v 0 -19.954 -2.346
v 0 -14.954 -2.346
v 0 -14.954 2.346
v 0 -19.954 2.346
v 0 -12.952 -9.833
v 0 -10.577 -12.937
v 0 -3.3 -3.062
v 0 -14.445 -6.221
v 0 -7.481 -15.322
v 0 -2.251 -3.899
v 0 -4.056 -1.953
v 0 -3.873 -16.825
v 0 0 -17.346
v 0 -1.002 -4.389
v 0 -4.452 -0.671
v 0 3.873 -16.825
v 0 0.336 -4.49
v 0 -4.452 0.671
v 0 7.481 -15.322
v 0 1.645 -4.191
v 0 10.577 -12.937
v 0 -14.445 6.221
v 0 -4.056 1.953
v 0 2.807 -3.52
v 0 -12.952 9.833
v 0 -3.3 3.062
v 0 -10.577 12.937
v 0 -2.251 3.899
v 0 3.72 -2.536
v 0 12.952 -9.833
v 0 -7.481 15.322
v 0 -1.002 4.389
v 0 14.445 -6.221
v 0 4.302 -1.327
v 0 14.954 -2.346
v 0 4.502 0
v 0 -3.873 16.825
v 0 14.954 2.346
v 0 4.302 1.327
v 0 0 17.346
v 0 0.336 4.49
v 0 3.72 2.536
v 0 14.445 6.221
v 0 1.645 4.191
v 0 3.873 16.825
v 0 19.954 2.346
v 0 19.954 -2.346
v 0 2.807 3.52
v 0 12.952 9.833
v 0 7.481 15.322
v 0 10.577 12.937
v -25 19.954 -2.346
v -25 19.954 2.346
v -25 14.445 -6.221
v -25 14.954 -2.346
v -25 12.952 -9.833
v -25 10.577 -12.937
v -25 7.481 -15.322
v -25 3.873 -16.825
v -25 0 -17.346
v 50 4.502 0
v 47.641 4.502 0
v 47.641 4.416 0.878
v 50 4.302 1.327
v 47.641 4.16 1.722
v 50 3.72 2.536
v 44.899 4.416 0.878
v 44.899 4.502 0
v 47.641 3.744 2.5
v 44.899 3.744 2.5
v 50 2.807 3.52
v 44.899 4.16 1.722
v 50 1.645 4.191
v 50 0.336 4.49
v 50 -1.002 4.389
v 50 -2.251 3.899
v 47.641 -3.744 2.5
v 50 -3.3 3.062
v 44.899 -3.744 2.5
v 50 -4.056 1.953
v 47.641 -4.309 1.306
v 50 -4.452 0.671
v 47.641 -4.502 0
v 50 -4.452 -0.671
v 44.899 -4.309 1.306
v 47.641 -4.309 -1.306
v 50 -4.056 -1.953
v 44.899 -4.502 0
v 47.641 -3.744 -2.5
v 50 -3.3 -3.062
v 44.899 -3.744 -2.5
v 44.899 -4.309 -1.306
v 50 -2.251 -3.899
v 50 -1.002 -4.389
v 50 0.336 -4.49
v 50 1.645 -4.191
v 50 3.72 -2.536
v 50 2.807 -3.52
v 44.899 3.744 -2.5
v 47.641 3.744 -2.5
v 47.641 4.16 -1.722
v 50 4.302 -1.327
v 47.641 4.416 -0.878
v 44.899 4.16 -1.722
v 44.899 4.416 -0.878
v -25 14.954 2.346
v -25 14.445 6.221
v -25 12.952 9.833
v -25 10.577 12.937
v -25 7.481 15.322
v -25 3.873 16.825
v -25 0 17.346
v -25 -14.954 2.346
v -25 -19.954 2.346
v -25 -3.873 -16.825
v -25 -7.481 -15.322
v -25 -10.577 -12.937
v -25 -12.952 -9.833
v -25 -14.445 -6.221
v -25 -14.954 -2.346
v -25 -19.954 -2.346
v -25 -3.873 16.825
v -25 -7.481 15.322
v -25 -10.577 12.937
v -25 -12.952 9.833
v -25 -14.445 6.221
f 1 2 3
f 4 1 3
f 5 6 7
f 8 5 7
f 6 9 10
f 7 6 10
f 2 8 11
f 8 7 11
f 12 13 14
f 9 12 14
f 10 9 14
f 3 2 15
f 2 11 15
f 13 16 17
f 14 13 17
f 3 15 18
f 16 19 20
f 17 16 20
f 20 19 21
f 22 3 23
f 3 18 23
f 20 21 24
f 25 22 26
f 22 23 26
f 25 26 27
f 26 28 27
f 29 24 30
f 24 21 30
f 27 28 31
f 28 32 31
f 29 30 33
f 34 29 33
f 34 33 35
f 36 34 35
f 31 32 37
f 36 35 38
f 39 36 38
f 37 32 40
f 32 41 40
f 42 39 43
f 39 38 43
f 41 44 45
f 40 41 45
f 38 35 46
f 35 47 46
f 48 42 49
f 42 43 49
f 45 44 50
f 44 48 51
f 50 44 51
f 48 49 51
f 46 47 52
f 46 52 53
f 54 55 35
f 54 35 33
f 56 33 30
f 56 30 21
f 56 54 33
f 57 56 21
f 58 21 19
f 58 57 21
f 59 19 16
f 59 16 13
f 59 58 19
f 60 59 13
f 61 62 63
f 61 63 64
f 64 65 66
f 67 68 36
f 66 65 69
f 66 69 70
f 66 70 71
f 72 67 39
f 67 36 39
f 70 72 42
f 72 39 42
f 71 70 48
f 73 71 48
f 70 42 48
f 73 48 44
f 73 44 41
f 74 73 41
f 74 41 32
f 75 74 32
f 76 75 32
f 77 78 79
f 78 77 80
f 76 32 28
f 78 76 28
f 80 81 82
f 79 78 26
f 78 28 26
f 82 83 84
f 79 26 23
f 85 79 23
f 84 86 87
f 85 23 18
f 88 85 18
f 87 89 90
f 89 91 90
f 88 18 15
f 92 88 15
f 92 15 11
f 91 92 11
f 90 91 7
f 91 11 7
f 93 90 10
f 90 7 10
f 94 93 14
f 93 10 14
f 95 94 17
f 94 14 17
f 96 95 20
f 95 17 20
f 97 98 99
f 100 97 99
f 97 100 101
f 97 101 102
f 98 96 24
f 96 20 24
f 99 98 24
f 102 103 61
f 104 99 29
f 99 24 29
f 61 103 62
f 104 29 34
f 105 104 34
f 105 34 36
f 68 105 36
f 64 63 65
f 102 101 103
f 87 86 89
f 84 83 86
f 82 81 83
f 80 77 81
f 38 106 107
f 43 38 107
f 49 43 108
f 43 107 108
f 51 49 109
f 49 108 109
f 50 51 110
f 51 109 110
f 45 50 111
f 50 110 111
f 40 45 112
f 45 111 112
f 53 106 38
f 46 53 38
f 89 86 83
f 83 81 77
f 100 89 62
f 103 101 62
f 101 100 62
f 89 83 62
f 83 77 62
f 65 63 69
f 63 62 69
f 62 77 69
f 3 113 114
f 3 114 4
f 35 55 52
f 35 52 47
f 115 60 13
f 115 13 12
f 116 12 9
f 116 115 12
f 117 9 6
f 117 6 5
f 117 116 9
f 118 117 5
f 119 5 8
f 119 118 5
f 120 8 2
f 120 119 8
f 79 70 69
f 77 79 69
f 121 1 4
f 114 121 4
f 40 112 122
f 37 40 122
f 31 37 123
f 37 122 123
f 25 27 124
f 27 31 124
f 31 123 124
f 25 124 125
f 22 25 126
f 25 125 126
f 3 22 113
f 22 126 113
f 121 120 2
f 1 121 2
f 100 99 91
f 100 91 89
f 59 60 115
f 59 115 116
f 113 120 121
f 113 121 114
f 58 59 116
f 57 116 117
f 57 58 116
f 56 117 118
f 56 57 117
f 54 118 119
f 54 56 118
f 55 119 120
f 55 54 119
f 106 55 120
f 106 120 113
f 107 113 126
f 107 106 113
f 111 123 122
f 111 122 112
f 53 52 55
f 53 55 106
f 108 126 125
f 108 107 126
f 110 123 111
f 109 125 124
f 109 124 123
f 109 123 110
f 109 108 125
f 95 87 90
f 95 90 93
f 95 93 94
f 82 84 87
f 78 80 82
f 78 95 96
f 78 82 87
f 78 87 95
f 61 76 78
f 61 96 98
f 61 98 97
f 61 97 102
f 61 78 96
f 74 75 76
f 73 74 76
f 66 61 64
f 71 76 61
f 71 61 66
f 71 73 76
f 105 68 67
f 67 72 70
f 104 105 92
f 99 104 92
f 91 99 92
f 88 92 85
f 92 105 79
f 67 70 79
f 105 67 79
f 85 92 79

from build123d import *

# Parameters (mm, degrees)
F0_W        = 29.9085080624
F0_H        = 34.6928238869
F1_DEPTH    = 25
F2_R        = 4.5021693383
F3_DEPTH    = 50
F4_T1_DEPTH = 100
F5_DEPTH    = 5
F6_DEPTH    = 5
F8_DEPTH    = 2.5


# Not quite as in the source:
# - a fillet or chamfer that OpenCascade refuses, or shapes differently, is made with other operations: its cross-section is extruded or revolved along the edge and cut away or added


with BuildPart() as f1:
    # F0 (on Right) → F1 (new body)
    with BuildSketch(Plane.YZ):
        Rectangle(F0_W, F0_H)
    extrude(amount=-F1_DEPTH)

    # F2 (on Right) → F3 (join)
    with BuildSketch(Plane.YZ):
        Circle(F2_R)
    extrude(amount=F3_DEPTH)

    # F4: fillet of radius 15 on 4 edges, made by hand

    # F4_s2 → F4_t1 (cut)
    with BuildSketch(Plane.YZ.offset(-62.5)):
        with BuildLine():
            ThreePointArc((0.0457459688, 17.3464119434), (-10.560855749, 12.9530136612), (-14.9542540312, 2.3464119434))
            Line((-14.9542540312, 2.3464119434), (-14.9542540312, 17.3464119434))
            Line((-14.9542540312, 17.3464119434), (0.0457459688, 17.3464119434))
        make_face()
        with BuildLine():
            ThreePointArc((14.9542540312, -2.3464119434), (10.560855749, -12.9530136612), (-0.0457459688, -17.3464119434))
            Line((-0.0457459688, -17.3464119434), (14.9542540312, -17.3464119434))
            Line((14.9542540312, -17.3464119434), (14.9542540312, -2.3464119434))
        make_face()
        with BuildLine():
            ThreePointArc((14.9542540312, 2.3464119434), (10.560855749, 12.9530136612), (-0.0457459688, 17.3464119434))
            Line((-0.0457459688, 17.3464119434), (14.9542540312, 17.3464119434))
            Line((14.9542540312, 17.3464119434), (14.9542540312, 2.3464119434))
        make_face()
        with BuildLine():
            ThreePointArc((0.0457459688, -17.3464119434), (-10.560855749, -12.9530136612), (-14.9542540312, -2.3464119434))
            Line((-14.9542540312, -2.3464119434), (-14.9542540312, -17.3464119434))
            Line((-14.9542540312, -17.3464119434), (0.0457459688, -17.3464119434))
        make_face()
    extrude(amount=F4_T1_DEPTH, mode=Mode.SUBTRACT)

    # F5 (add): a face of the model
    f5_faces = [f1.faces().sort_by_distance(p)[0] for p in [
        (-12.5, 14.9542540312, 0),
    ]]
    extrude(f5_faces, amount=F5_DEPTH)

    # F6 (add): a face of the model
    f6_faces = [f1.faces().sort_by_distance(p)[0] for p in [
        (-12.5, -14.9542540312, 0),
    ]]
    extrude(f6_faces, amount=F6_DEPTH)

    # F7 (on Top) → F8 (cut, symmetric)
    with BuildSketch(Plane.XY):
        Polygon((44.8985174298, 7.189091295), (44.8985174298, -8.9538004249), (47.6411059499, -8.9538004249), (47.6411059499, 6.886465475), align=None)
    extrude(amount=F8_DEPTH, both=True, mode=Mode.SUBTRACT)


solid = f1.part
